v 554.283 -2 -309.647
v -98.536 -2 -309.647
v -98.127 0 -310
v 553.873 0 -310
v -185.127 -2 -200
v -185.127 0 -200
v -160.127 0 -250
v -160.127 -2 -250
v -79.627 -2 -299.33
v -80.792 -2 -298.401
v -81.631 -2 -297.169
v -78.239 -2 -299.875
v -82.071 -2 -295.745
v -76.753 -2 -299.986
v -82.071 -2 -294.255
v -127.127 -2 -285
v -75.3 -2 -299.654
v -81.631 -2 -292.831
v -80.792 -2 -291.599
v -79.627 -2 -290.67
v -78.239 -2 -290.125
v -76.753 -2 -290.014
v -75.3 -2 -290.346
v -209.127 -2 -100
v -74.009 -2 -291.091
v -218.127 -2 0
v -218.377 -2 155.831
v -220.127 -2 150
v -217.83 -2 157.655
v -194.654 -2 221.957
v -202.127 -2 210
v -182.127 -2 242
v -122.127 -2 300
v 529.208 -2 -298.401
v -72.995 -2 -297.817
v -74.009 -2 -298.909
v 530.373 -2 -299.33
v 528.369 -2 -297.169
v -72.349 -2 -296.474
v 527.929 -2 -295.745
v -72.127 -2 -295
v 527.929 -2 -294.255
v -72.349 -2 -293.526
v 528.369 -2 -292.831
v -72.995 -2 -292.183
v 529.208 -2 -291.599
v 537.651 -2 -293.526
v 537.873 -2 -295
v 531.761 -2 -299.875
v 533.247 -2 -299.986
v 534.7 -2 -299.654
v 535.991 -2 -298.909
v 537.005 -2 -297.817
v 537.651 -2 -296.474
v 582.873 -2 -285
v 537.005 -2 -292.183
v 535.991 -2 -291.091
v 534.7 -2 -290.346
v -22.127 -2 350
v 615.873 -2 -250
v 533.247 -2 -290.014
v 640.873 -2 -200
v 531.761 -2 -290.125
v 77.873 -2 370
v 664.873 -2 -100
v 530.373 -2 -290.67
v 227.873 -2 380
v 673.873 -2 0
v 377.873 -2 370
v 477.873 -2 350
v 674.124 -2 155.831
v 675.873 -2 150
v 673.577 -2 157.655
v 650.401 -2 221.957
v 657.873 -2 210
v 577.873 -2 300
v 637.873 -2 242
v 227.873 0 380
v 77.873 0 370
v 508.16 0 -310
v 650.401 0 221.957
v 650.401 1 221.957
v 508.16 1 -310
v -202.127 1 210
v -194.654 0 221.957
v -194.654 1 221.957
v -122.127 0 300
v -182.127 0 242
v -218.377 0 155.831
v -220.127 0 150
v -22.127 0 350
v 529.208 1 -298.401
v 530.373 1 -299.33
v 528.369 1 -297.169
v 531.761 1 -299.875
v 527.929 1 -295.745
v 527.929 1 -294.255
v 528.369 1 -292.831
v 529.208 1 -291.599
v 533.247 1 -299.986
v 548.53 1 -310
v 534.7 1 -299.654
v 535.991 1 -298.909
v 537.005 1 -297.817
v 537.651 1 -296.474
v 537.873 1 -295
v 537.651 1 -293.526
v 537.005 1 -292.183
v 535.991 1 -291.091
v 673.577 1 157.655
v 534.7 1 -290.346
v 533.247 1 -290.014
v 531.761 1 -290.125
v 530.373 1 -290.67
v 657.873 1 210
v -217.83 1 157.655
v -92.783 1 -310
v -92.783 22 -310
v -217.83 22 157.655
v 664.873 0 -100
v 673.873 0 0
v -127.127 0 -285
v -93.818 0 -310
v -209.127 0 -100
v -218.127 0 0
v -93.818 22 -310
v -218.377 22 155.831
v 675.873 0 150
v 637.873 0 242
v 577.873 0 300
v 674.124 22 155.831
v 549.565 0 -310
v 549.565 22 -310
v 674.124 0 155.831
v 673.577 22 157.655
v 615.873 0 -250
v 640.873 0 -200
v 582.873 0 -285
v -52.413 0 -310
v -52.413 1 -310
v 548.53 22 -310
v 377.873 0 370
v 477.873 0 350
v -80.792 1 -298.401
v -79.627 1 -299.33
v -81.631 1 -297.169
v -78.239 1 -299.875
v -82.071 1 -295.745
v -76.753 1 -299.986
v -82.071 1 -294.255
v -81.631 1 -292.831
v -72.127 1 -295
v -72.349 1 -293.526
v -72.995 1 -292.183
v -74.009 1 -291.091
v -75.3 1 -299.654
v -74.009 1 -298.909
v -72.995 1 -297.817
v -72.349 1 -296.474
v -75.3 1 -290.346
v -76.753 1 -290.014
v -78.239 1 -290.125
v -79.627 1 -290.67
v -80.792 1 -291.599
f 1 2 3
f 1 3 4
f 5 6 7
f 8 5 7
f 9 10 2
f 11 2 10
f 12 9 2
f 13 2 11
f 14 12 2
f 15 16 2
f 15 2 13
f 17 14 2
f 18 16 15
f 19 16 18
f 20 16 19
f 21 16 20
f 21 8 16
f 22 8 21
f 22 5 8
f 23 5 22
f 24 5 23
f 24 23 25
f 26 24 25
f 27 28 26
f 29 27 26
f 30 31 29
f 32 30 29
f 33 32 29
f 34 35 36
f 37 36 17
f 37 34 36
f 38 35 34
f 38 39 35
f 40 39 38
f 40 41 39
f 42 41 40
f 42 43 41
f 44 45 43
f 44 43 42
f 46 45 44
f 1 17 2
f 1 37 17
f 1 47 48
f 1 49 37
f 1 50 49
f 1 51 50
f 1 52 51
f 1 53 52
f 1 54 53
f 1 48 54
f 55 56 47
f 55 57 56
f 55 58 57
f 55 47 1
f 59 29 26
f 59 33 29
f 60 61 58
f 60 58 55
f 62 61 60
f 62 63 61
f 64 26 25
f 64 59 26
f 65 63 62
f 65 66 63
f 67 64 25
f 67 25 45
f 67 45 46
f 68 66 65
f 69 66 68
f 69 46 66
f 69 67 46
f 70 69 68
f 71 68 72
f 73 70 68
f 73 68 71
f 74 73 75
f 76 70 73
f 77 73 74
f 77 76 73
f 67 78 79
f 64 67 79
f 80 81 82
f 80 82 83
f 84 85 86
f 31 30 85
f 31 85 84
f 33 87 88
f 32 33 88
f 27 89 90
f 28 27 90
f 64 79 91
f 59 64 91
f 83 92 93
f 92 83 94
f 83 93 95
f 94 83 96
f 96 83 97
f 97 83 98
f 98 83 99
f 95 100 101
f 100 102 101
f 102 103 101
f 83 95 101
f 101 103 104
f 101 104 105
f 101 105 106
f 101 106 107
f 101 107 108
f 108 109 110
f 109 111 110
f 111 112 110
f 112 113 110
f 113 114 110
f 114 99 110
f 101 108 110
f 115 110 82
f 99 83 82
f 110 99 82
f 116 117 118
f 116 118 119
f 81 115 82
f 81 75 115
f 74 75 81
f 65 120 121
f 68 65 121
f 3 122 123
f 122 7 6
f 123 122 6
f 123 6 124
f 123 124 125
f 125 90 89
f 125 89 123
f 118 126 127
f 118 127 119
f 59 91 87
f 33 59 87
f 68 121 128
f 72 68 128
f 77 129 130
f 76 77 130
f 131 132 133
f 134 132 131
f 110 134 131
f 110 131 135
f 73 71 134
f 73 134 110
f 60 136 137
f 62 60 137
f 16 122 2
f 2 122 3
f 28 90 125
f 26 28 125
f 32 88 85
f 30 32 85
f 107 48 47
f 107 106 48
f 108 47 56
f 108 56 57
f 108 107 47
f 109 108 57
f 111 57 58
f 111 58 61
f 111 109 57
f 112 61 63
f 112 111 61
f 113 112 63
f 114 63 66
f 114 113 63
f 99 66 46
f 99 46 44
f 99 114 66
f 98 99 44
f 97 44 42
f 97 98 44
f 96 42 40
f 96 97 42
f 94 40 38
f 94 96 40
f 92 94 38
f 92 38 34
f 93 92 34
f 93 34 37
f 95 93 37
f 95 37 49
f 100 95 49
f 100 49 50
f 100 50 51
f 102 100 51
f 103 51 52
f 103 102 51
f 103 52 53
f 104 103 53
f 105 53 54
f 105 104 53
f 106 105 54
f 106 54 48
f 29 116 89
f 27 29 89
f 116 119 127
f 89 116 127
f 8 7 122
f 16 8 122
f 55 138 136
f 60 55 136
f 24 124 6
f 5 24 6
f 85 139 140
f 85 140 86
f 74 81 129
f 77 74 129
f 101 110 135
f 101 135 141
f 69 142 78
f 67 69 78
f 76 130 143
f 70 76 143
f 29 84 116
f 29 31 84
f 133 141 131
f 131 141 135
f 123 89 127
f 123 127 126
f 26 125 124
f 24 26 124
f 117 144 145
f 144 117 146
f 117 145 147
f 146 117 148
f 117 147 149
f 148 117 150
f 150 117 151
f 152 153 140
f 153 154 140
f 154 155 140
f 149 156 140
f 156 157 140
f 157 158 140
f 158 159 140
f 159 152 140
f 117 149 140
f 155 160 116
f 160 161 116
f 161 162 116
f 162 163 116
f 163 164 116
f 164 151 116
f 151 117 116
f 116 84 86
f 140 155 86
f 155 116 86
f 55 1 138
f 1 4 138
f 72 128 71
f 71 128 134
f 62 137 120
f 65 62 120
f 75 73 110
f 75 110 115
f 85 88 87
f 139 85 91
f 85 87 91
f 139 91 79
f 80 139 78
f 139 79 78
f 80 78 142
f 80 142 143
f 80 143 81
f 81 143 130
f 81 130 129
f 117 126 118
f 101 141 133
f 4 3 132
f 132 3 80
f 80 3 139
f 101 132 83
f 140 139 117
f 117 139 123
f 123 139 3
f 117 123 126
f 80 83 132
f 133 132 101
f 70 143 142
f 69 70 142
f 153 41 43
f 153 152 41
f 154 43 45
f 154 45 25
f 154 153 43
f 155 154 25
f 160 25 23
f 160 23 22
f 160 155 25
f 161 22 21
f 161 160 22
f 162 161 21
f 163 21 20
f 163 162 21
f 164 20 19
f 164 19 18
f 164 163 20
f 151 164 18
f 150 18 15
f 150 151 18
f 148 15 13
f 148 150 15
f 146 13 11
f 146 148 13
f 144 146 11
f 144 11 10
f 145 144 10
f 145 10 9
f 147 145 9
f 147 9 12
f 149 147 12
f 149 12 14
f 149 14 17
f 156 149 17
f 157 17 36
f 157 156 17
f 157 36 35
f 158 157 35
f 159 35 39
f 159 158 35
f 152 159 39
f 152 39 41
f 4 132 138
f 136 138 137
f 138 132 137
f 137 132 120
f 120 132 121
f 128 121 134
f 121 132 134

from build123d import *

# Parameters (mm, degrees)
F0_R     = 5
F1_DEPTH = 2
F2_DEPTH = 1
F3_DEPTH = 22
F4_SIZE2 = 0.352644
F4_SIZE  = 1.99999


# Not quite as in the source:
# - a fillet or chamfer is up to 0.001 mm smaller than in the source, because OpenCascade refuses the exact size


with BuildPart() as f1:
    # F0 (on Front) → F1 (new body)
    with BuildSketch(Plane.XZ):
        Polygon((-202.1265400052, 210), (-217.8300492651, 157.6549691337), (-92.7831770837, -310), (-52.4130318677, -310), (-194.6536201768, 221.9566717254), align=None)
        with Locations((-77.1265400052, -295)):
            Circle(F0_R, mode=Mode.SUBTRACT)
        Polygon((-182.1265400052, 242), (-194.6536201768, 221.9566717254), (-52.4130318677, -310), (227.8734599948, -310), (508.1599518573, -310), (650.4005401664, 221.9566717254), (637.8734599948, 242), (577.8734599948, 300), (477.8734599948, 350), (377.8734599948, 370), (227.8734599948, 380), (77.8734599948, 370), (-22.1265400052, 350), (-122.1265400052, 300), align=None)
        Polygon((650.4005401664, 221.9566717254), (508.1599518573, -310), (548.5300970733, -310), (673.5769692547, 157.6549691337), (657.8734599948, 210), align=None)
        with Locations((532.8734599948, -295)):
            Circle(F0_R, mode=Mode.SUBTRACT)
        Polygon((-220.1265400052, 150), (-218.1265400052, 0), (-209.1265400052, -100), (-185.1265400052, -200), (-160.1265400052, -250), (-127.1265400052, -285), (-98.1265400052, -310), (-93.8183090123, -310), (-218.3773603998, 155.8305986848), align=None)
        Polygon((674.1242803894, 155.8305986848), (549.5652290019, -310), (553.8734599948, -310), (582.8734599948, -285), (615.8734599948, -250), (640.8734599948, -200), (664.8734599948, -100), (673.8734599948, 0), (675.8734599948, 150), align=None)
        Polygon((673.5769692547, 157.6549691337), (548.5300970733, -310), (549.5652290019, -310), (674.1242803894, 155.8305986848), align=None)
        Polygon((-217.8300492651, 157.6549691337), (-218.3773603998, 155.8305986848), (-93.8183090123, -310), (-92.7831770837, -310), align=None)
    extrude(amount=F1_DEPTH)

    # F0 (on Front) → F2 (join)
    with BuildSketch(Plane.XZ):
        Polygon((-202.1265400052, 210), (-217.8300492651, 157.6549691337), (-92.7831770837, -310), (-52.4130318677, -310), (-194.6536201768, 221.9566717254), align=None)
        with Locations((-77.1265400052, -295)):
            Circle(F0_R, mode=Mode.SUBTRACT)
        Polygon((650.4005401664, 221.9566717254), (508.1599518573, -310), (548.5300970733, -310), (673.5769692547, 157.6549691337), (657.8734599948, 210), align=None)
        with Locations((532.8734599948, -295)):
            Circle(F0_R, mode=Mode.SUBTRACT)
    extrude(amount=-F2_DEPTH)

    # F0 (on Front) → F3 (join)
    with BuildSketch(Plane.XZ):
        Polygon((673.5769692547, 157.6549691337), (548.5300970733, -310), (549.5652290019, -310), (674.1242803894, 155.8305986848), align=None)
        Polygon((-217.8300492651, 157.6549691337), (-218.3773603998, 155.8305986848), (-93.8183090123, -310), (-92.7831770837, -310), align=None)
    extrude(amount=-F3_DEPTH)

    # F4 (size 2 and 0.3526539614 in the source; OpenCascade refuses exactly that, so slightly less here)
    f4_edges = [f1.edges().sort_by_distance(p)[0] for p in [
        (227.87346, -2, -310),
    ]]
    f4_side = f1.faces().sort_by_distance((227.87346, -0.533198, -310))[0]
    chamfer(f4_edges, length=F4_SIZE, length2=F4_SIZE2, reference=f4_side)


solid = f1.part
